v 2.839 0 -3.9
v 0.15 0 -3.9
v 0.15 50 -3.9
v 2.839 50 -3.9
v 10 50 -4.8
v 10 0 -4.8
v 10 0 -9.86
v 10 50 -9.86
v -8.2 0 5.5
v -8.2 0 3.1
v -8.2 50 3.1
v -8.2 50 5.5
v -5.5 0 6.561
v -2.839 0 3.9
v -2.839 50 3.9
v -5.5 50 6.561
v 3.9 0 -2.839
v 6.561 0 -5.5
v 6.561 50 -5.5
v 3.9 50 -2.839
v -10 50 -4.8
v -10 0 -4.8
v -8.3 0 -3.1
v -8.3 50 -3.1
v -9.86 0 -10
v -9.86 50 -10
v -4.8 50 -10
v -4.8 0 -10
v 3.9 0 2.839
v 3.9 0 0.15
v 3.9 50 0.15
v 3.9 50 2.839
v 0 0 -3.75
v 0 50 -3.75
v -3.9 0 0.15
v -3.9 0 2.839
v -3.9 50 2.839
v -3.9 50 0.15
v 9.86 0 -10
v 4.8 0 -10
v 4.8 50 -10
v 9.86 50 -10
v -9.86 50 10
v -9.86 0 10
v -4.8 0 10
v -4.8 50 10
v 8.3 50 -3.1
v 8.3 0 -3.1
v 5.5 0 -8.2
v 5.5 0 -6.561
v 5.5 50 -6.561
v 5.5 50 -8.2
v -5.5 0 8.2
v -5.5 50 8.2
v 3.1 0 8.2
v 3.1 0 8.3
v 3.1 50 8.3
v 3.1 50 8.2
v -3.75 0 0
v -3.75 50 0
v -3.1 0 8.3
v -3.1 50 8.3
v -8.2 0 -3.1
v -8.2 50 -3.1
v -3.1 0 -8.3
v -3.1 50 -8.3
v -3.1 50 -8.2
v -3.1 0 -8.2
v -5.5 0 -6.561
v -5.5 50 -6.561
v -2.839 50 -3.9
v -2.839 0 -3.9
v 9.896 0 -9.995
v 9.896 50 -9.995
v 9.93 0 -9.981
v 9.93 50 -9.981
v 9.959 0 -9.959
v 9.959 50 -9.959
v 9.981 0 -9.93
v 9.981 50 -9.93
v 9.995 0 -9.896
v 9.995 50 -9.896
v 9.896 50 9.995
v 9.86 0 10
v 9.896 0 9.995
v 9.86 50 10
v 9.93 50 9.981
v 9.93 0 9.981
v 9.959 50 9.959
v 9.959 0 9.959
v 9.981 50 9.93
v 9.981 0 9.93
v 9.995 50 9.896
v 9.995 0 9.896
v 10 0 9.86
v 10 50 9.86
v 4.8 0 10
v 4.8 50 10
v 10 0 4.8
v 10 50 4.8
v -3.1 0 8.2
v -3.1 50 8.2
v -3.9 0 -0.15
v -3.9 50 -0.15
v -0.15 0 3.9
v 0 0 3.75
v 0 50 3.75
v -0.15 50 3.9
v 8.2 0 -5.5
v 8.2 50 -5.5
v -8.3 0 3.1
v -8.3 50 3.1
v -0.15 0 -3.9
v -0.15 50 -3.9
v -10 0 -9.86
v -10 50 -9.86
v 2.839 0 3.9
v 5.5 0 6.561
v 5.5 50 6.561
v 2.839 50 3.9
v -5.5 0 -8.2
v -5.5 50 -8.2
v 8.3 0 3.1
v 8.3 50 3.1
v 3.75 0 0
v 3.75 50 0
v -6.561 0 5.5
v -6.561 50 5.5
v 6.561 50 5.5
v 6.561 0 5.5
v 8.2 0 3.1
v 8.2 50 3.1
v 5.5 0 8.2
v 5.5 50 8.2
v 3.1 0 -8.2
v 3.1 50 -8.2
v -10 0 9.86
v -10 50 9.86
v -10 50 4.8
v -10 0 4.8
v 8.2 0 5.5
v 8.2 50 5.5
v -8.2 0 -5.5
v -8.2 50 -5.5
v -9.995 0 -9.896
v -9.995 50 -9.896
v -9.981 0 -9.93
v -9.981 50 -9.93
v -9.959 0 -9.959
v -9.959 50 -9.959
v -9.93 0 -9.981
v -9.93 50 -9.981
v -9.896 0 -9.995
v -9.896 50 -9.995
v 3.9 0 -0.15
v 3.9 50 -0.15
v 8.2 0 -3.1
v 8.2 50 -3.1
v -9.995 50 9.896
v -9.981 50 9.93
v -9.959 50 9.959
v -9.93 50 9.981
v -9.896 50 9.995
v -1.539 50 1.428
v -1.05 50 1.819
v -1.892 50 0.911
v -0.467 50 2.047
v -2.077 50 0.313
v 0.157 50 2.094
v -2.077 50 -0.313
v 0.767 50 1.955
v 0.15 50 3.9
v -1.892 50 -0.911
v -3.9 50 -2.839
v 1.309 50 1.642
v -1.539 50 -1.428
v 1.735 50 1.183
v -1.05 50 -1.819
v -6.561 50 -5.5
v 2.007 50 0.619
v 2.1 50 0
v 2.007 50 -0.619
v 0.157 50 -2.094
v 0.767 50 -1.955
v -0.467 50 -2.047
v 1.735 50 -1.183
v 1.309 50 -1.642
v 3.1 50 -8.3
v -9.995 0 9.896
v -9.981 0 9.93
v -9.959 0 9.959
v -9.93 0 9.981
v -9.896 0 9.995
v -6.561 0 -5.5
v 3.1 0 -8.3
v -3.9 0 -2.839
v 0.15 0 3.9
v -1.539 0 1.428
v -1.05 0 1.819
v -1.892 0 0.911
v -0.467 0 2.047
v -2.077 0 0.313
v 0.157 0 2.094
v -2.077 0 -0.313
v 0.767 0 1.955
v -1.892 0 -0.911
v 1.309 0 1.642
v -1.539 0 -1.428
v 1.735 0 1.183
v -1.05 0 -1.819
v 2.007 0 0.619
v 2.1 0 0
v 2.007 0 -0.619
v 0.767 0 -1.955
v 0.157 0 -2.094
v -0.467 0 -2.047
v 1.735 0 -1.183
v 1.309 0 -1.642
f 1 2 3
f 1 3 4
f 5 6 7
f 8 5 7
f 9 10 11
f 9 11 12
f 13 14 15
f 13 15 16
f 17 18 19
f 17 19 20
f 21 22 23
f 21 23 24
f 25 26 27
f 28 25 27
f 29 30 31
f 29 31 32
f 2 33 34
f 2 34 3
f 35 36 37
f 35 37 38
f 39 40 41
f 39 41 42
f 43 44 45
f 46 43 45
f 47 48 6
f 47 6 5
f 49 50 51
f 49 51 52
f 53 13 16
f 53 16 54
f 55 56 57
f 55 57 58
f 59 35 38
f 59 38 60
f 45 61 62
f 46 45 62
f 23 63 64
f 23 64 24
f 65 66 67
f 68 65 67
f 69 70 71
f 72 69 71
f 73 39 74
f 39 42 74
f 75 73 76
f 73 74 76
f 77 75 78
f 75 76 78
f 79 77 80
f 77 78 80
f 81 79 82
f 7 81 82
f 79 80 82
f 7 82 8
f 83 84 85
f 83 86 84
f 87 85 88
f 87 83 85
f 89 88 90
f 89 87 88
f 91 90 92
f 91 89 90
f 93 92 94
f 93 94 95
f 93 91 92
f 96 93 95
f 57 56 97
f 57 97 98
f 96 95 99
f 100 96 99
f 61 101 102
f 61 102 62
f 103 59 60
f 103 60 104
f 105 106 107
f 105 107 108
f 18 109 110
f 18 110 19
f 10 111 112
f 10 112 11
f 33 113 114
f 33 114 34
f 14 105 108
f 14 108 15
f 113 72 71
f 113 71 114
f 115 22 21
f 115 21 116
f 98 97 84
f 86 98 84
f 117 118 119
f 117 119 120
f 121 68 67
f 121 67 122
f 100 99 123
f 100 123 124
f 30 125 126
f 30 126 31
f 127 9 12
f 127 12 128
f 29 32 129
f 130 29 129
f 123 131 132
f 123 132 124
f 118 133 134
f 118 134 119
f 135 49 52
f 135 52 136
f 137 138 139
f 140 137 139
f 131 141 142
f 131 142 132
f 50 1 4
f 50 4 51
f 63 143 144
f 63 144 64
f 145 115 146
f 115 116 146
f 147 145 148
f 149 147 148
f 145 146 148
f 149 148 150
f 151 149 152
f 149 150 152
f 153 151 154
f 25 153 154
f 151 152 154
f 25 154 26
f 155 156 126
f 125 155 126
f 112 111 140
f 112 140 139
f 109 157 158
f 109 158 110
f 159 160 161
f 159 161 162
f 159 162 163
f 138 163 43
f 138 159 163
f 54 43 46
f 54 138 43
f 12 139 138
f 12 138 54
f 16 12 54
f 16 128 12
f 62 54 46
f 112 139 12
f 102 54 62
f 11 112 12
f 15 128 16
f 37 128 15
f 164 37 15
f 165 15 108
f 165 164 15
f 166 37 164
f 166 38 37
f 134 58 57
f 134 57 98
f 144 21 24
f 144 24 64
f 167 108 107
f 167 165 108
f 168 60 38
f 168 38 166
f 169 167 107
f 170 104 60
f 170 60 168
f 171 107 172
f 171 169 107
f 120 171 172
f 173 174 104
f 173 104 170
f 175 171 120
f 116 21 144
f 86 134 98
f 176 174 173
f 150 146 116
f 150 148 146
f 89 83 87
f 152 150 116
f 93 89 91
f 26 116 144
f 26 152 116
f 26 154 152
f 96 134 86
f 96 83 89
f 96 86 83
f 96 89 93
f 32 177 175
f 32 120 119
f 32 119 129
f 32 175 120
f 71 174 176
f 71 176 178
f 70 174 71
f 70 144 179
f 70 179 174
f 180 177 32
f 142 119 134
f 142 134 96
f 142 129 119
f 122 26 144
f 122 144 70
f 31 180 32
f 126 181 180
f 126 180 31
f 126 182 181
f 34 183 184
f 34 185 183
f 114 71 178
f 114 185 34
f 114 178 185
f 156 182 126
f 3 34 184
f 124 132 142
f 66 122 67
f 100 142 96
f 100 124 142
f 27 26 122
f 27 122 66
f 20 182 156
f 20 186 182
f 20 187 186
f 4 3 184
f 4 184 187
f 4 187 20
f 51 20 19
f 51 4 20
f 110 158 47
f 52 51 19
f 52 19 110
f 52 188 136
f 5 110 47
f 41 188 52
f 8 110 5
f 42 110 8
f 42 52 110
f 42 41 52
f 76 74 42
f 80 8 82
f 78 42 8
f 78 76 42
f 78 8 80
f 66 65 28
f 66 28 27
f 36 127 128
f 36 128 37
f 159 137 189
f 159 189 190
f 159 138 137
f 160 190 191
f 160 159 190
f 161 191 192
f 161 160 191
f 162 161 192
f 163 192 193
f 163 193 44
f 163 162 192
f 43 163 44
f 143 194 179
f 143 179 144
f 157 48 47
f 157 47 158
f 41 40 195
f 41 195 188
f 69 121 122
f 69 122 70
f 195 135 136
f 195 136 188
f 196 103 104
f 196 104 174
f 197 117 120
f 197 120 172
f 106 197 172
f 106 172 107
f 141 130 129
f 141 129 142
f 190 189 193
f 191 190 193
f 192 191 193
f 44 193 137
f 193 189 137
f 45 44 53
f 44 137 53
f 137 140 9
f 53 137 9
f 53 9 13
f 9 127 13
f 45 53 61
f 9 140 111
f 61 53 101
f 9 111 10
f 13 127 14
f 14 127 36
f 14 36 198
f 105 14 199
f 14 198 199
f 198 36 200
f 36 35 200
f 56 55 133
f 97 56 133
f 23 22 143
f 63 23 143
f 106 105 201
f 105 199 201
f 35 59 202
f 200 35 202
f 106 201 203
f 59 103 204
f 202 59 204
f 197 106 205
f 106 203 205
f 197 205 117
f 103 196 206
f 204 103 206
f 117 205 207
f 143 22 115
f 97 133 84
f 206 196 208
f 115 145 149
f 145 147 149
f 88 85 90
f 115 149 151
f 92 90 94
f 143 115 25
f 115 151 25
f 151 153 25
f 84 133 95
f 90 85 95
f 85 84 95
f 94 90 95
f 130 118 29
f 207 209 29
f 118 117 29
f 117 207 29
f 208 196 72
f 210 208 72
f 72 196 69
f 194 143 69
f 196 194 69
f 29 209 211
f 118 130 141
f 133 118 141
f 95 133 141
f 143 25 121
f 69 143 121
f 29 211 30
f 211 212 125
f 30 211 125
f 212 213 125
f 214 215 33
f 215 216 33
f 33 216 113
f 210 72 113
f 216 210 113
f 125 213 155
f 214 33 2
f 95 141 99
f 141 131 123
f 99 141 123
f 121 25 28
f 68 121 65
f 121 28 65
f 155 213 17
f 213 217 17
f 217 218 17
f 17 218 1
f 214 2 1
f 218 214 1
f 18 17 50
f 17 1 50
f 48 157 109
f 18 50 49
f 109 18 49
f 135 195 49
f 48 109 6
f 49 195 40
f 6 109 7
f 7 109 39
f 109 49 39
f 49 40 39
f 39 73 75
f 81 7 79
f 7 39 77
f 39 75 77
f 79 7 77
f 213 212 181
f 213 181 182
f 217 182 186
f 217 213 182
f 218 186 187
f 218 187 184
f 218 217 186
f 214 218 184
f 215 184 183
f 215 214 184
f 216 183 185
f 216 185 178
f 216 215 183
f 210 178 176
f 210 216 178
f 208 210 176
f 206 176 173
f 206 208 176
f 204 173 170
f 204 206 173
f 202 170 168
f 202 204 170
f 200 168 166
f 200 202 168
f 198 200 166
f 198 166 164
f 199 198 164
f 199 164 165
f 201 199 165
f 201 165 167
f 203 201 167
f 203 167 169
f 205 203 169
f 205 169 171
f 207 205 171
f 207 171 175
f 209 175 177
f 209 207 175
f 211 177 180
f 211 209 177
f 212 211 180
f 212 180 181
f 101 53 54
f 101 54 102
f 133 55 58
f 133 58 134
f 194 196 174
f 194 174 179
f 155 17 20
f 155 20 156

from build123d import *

# Parameters (mm, degrees)
SKETCH3_W           = 20
SKETCH3_H           = 20
SKETCH3_R           = 2.1
BOSS_EXTRUDE1_DEPTH = 50
CUT_EXTRUDE1_START  = -1
CUT_EXTRUDE1_DEPTH  = 52
CIRPATTERN1_COUNT   = 4
CHAMFER2_SIZE       = 1.7
FILLET1_R           = 0.14


with BuildPart() as part:
    # Sketch3 → Boss-Extrude1 (new body)
    with BuildSketch(Plane(origin=(0, 0, 0), x_dir=(1, 0, 0), z_dir=(0, 1, 0))):
        Rectangle(SKETCH3_W, SKETCH3_H)
        Circle(SKETCH3_R, mode=Mode.SUBTRACT)
    extrude(amount=BOSS_EXTRUDE1_DEPTH)

    # Sketch4 → Cut-Extrude1 (cut)
    with BuildSketch(Plane(origin=(0, 0, 0), x_dir=(1, 0, 0), z_dir=(0, 1, 0)).offset(CUT_EXTRUDE1_START)):
        Polygon((-3.1, 10), (-3.1, 8.2), (-5.5, 8.2), (-5.5, 6.560660172), (-2.839339828, 3.9), (-0.15, 3.9), (0, 3.75), (0.15, 3.9), (2.839339828, 3.9), (5.5, 6.560660172), (5.5, 8.2), (3.1, 8.2), (3.1, 10), align=None)
    cut_extrude1 = extrude(amount=CUT_EXTRUDE1_DEPTH, mode=Mode.SUBTRACT)

    # CirPattern1: Cut-Extrude1 ×4 about axis
    cirpattern1_axis = Axis((0, 0, 0), (0, 1, 0))
    for i in range(1, CIRPATTERN1_COUNT):
        add(cut_extrude1.rotate(cirpattern1_axis, i * 360 / CIRPATTERN1_COUNT), mode=Mode.SUBTRACT)

    # Chamfer2
    chamfer2_edges = [part.edges().sort_by_distance(p)[0] for p in [
        (-3.1, 25, 10),
        (3.1, 25, 10),
        (-10, 25, -3.1),
        (-10, 25, 3.1),
        (10, 25, 3.1),
        (10, 25, -3.1),
        (3.1, 25, -10),
        (-3.1, 25, -10),
    ]]
    chamfer(chamfer2_edges, length=CHAMFER2_SIZE)

    # Fillet1
    fillet1_edges = [part.edges().sort_by_distance(p)[0] for p in [
        (10, 25, 10),
        (-10, 25, 10),
        (-10, 25, -10),
        (10, 25, -10),
    ]]
    fillet(fillet1_edges, radius=FILLET1_R)


solid = part.part
